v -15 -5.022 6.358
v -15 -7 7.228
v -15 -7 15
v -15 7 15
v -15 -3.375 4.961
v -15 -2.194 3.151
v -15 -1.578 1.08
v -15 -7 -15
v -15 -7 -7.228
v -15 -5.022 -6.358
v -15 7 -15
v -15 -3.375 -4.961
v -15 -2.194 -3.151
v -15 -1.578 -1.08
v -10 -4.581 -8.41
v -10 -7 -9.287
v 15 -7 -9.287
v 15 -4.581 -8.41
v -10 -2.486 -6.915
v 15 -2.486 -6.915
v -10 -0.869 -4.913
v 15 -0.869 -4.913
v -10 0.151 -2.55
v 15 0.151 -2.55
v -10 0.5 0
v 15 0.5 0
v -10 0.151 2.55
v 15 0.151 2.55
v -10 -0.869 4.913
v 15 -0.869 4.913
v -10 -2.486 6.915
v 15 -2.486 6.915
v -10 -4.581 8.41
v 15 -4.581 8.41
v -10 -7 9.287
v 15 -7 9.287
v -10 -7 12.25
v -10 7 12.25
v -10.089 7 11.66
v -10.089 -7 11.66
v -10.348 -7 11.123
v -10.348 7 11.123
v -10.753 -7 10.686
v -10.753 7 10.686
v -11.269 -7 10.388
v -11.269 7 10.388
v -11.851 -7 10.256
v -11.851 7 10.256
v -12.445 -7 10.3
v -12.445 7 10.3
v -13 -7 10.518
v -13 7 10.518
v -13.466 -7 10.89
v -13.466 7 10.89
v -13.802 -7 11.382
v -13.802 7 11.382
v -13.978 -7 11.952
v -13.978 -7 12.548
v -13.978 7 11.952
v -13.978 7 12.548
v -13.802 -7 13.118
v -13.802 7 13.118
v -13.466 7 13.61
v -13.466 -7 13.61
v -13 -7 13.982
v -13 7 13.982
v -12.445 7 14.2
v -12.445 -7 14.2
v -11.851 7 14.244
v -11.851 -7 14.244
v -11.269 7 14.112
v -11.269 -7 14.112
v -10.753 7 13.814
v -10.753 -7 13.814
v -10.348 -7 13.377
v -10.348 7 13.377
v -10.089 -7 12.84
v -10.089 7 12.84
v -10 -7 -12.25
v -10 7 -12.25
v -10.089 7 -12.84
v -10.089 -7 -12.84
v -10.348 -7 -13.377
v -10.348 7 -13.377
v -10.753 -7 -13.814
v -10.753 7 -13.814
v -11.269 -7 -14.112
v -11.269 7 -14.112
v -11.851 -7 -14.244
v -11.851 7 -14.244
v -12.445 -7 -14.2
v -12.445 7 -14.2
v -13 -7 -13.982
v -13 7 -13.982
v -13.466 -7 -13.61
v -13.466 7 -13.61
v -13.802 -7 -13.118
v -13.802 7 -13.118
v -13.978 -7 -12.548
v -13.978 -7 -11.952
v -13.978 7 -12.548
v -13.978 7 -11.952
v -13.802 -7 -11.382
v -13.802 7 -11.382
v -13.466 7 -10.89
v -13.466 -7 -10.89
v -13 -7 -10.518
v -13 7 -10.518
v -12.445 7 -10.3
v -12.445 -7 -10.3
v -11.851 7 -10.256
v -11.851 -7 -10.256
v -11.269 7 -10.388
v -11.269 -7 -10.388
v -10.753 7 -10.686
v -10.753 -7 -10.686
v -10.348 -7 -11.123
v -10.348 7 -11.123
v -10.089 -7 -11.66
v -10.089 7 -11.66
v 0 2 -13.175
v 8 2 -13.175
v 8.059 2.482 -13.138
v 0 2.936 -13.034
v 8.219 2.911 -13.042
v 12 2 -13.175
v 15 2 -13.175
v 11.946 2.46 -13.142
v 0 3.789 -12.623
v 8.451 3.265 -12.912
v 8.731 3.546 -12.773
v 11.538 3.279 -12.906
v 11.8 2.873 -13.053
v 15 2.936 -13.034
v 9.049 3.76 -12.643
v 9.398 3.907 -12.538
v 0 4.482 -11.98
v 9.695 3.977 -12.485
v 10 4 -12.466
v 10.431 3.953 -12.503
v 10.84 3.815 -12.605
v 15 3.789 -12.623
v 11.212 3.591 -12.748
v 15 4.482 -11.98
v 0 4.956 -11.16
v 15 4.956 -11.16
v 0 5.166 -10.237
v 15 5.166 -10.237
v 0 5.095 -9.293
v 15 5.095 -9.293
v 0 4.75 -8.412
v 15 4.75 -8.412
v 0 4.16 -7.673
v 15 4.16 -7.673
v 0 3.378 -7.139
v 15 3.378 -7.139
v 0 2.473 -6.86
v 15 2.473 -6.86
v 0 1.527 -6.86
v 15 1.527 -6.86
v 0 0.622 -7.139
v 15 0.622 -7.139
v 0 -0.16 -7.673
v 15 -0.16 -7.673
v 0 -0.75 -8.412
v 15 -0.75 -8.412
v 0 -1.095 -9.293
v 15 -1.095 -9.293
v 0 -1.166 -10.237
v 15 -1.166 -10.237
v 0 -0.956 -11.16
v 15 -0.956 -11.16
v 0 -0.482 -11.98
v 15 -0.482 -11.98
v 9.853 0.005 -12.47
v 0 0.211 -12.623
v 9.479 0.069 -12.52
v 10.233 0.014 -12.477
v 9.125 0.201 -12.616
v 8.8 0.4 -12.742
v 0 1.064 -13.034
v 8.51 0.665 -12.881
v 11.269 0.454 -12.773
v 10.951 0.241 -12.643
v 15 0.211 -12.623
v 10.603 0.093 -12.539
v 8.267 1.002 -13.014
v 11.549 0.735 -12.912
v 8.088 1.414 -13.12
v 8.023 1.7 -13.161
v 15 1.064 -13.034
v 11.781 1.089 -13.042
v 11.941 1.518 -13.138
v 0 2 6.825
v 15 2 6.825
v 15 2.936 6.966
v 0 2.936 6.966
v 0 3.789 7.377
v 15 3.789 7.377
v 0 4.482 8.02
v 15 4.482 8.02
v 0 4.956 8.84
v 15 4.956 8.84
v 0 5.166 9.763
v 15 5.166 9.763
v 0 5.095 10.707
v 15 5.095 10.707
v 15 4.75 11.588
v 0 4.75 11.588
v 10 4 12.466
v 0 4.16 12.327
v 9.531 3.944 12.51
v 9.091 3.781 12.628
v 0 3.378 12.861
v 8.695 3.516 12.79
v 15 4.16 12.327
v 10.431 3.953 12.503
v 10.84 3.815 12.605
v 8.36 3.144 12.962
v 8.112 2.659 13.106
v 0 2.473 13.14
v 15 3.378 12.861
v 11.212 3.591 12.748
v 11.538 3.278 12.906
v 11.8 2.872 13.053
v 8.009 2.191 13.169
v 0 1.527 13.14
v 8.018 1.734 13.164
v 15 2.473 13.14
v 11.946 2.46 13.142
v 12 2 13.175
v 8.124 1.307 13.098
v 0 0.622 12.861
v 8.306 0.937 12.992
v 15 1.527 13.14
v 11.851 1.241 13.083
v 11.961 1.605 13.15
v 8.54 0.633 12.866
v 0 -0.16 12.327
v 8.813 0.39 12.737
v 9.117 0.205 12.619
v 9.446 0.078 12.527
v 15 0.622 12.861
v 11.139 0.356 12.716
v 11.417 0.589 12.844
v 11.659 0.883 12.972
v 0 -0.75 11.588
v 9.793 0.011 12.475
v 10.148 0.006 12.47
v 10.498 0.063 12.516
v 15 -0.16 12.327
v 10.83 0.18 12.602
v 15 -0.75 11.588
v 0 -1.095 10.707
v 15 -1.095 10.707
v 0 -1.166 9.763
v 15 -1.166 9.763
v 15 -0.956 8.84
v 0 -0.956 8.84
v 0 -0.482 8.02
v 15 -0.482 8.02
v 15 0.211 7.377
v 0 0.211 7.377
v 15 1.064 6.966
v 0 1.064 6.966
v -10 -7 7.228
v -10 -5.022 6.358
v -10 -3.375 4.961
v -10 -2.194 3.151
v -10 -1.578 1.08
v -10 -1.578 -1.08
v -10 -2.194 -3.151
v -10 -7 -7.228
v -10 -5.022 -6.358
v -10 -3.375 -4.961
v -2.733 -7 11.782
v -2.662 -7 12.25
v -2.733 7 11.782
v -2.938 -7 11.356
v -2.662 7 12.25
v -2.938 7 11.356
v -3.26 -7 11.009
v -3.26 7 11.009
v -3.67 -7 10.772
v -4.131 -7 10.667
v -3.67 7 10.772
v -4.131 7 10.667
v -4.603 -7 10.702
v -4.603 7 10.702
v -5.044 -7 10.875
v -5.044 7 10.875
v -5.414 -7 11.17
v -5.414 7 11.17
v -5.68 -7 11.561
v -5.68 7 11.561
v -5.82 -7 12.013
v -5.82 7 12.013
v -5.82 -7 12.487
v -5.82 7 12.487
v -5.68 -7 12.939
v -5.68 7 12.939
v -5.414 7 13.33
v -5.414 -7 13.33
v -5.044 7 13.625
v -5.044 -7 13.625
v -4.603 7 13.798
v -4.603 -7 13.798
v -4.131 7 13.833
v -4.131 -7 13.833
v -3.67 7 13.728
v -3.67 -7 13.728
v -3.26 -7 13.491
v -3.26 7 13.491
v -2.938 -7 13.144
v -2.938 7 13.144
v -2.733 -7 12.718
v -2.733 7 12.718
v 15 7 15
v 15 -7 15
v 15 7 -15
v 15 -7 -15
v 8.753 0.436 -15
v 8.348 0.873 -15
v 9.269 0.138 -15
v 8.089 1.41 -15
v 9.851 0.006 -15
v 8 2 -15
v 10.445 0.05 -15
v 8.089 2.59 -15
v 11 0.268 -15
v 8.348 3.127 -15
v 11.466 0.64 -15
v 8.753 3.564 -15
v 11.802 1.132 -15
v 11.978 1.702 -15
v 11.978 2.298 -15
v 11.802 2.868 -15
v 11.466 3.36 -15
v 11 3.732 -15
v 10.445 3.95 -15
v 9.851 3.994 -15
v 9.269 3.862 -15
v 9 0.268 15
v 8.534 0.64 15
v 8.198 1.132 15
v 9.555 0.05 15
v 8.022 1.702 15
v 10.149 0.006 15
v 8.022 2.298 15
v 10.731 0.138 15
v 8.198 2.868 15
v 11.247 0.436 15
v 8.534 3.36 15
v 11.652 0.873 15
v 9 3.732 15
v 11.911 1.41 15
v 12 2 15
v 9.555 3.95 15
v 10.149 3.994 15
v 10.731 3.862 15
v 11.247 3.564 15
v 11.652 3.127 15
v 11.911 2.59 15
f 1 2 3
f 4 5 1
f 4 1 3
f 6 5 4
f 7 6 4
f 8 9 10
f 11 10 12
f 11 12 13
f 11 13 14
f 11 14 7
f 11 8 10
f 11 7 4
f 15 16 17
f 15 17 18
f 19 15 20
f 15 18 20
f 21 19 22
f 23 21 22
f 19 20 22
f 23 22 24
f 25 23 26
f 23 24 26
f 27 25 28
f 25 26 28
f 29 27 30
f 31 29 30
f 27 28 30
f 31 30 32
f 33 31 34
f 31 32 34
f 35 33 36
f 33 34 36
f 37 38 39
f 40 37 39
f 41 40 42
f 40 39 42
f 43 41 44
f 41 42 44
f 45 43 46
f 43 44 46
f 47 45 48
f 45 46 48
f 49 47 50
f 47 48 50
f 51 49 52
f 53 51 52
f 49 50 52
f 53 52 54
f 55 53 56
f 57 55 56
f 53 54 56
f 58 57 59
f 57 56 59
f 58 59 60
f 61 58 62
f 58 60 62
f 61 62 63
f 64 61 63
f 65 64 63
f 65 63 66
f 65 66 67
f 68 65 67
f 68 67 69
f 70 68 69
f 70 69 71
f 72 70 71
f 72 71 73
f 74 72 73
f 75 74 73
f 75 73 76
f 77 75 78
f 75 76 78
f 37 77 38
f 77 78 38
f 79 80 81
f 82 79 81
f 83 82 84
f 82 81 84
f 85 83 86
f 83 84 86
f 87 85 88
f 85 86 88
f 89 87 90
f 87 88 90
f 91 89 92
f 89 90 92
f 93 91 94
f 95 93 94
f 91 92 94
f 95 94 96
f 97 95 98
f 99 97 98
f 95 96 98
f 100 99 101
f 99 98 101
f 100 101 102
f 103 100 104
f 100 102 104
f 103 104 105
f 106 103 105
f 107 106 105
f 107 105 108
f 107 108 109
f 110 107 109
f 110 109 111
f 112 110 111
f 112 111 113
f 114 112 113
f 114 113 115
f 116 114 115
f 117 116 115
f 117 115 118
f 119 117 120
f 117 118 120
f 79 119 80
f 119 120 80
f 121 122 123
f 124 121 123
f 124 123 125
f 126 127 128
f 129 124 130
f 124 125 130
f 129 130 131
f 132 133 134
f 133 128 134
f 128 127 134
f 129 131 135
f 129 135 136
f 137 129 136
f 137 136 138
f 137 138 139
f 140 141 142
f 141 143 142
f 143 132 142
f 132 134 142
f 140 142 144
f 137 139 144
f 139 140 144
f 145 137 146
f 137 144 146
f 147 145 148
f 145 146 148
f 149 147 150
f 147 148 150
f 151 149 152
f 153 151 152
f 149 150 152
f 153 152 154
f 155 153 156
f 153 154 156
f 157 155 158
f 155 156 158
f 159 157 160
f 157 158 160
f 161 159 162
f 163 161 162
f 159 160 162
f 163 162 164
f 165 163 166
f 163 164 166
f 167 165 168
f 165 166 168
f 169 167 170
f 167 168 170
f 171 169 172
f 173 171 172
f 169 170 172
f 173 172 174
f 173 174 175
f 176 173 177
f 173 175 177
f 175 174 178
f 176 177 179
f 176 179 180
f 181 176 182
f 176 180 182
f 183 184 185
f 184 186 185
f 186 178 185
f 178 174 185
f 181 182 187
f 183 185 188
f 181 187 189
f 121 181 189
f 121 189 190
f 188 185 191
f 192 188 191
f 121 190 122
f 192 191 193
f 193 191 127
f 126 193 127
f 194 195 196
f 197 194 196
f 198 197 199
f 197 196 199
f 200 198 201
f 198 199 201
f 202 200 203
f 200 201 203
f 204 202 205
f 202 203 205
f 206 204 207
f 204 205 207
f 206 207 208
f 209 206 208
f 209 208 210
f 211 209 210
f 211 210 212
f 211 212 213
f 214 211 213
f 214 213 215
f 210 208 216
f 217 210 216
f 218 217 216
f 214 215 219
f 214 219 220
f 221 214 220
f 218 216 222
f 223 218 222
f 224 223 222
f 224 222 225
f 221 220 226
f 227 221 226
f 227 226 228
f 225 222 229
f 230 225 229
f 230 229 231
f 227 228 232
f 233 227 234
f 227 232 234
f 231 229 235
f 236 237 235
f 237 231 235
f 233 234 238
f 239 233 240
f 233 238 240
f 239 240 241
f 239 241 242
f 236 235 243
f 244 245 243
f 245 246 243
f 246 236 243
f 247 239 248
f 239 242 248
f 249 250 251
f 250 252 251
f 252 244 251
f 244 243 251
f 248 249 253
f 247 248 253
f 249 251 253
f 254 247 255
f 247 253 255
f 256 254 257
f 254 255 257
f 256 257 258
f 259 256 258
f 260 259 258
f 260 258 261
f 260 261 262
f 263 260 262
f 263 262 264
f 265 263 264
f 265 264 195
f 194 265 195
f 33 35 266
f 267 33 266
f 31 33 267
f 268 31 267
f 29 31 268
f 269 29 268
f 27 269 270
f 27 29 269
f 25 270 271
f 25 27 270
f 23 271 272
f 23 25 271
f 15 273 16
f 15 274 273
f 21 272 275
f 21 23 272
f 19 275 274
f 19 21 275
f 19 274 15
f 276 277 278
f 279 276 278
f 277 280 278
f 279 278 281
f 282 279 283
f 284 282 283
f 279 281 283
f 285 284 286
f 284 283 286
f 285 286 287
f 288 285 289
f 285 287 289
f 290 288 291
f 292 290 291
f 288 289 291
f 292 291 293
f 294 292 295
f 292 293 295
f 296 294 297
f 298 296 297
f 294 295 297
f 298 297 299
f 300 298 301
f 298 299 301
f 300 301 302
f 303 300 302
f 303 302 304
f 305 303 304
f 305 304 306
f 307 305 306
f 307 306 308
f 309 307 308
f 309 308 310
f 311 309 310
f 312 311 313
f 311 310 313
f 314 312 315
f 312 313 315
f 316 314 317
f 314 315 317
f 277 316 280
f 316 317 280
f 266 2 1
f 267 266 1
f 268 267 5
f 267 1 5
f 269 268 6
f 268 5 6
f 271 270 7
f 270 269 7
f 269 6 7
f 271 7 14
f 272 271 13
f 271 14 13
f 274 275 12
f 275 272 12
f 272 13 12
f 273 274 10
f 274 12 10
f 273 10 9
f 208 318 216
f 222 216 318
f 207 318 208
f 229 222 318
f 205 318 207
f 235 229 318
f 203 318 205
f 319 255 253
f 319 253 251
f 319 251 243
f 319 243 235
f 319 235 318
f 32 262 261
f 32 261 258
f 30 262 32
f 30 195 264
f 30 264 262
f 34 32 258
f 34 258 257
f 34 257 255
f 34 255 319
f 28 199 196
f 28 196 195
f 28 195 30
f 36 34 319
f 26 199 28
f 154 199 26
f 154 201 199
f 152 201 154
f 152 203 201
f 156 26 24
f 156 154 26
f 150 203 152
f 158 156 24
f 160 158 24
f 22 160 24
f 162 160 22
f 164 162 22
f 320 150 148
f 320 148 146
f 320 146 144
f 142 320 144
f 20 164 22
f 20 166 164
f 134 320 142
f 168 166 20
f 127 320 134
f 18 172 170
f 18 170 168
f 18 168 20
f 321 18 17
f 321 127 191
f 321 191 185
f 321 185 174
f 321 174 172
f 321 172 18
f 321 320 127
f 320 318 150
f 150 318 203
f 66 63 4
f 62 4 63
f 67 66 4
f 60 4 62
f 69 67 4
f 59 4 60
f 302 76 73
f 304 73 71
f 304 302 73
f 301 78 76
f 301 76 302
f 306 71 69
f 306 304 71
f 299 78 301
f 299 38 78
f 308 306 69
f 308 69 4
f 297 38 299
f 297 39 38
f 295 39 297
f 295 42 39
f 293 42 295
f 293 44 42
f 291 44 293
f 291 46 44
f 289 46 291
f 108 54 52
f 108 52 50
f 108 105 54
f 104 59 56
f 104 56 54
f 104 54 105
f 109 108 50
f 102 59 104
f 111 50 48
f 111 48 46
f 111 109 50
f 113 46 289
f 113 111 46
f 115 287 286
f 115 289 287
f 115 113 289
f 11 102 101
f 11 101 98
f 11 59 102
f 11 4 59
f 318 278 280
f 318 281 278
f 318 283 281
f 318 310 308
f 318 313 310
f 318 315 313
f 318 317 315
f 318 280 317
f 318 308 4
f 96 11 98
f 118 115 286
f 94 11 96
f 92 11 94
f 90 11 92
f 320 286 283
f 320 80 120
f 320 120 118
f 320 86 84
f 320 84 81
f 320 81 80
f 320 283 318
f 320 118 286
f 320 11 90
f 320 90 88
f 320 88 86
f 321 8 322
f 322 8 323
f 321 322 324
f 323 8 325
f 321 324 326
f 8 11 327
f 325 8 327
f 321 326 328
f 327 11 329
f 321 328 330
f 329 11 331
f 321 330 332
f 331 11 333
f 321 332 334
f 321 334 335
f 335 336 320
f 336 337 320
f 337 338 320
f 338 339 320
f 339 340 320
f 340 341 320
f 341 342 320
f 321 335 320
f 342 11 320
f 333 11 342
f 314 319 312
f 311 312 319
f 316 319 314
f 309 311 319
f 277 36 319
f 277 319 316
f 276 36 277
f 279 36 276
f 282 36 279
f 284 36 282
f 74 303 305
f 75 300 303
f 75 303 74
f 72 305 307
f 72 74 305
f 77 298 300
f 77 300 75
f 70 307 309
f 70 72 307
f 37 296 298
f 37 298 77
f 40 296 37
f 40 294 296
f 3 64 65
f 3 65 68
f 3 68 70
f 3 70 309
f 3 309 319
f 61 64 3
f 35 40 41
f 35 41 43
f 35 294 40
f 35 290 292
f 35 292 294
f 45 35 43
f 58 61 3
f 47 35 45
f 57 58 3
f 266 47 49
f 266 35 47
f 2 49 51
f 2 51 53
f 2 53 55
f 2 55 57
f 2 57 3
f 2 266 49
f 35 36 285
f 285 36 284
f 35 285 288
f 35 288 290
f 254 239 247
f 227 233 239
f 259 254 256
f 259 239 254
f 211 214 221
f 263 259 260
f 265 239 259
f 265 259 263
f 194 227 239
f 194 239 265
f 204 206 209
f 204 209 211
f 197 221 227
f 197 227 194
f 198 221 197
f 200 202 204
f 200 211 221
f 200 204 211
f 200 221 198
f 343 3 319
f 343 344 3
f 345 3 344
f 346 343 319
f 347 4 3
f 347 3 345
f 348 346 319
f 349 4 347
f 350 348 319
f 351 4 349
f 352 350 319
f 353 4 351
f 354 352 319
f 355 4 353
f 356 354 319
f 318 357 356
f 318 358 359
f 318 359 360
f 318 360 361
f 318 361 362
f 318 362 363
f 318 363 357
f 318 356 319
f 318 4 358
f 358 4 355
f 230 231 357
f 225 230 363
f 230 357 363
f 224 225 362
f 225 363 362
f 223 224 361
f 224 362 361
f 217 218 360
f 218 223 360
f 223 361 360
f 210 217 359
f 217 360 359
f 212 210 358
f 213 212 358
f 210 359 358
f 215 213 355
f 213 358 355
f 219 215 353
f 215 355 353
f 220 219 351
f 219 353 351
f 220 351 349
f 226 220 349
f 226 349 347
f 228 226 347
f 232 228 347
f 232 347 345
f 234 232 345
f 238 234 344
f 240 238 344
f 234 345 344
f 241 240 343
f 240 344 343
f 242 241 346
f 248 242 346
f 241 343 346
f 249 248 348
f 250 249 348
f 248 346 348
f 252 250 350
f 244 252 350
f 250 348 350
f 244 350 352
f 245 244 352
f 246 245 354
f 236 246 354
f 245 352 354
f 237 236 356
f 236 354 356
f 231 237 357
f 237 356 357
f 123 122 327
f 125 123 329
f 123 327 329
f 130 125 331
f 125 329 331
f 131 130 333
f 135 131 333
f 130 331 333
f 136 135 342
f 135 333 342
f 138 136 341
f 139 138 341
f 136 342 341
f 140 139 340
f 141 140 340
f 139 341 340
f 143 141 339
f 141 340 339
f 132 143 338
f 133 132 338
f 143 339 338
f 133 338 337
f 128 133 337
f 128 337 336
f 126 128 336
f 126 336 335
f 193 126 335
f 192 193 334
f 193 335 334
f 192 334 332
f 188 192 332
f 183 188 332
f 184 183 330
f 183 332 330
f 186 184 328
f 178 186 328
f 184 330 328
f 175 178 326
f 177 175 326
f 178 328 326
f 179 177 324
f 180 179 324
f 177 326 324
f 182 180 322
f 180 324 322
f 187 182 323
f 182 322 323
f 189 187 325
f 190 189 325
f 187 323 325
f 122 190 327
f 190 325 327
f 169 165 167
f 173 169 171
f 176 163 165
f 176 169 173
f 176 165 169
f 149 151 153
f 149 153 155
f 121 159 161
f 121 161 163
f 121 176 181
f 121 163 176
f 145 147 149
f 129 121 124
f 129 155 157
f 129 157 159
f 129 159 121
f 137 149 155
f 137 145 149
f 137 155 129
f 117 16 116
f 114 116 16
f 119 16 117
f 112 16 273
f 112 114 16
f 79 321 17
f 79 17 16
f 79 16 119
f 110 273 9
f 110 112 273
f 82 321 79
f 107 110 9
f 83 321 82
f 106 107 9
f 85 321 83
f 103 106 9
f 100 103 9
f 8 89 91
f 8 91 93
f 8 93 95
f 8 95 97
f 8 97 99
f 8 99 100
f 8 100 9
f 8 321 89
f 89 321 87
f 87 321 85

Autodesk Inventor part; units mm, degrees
ref_plane "YZ Plane" through (0, 0, 0) normal (1, 0, 0) x (0, 1, 0)
ref_plane "XZ Plane" through (0, 0, 0) normal (0, 1, 0) x (-1, 0, 0)
ref_plane "XY Plane" through (0, 0, 0) normal (0, 0, 1) x (1, 0, 0)
sketch "Sketch1" plane through (0, 0, 0) normal (0, 0, 1) x (1, 0, 0)
  line L0 (15, -7) -> (-15, -7)
  line L1 (-15, -7) -> (-15, 7)
  line L2 (-15, 7) -> (15, 7)
  line L3 (15, 7) -> (15, -7)
  line L4 (15, -7) -> (-15, 7) construction
  line L5 (-15, -7) -> (15, 7) construction
  point P0 (0, 0)
  dimension "d0" = 30
  dimension "d1" = 14
extrude "Extrusion1" add sketch "Sketch1" along normal blind 30
sketch "Sketch3" plane through (15, -7, 0) normal (1, 0, 0) x (0, 0, -1)
  line L0 (0, 0) -> (-30, 0) projected
  line L1 (-15, 0) -> (-15, -2)
  arc A0 (-5.7129, 0) -> (-24.2871, 0) centre (-15, -2) ccw
  point P0 (0, 7)
  dimension "d4" = 2
  dimension "d5" = 19
extrude "Extrusion2" cut sketch "Sketch3" against normal blind 25
sketch "Sketch5" plane through (-15, 7, 0) normal (0, 1, 0) x (1, 0, 0)
  line L0 (30, 0) -> (0, 0) projected
  line L1 (30, -30) -> (0, -30) projected
  line L2 (0, -30) -> (0, -27.25)
  line L3 (0, 0) -> (0, -30) projected
  line L4 (0, -27.25) -> (2.75, -27.25)
  circle A0 centre (2.75, -27.25) radius 2
  line L5 (0, 0) -> (0, -2.75)
  line L6 (0, -2.75) -> (2.75, -2.75)
  circle A1 centre (2.75, -2.75) radius 2
  line L7 (2.75, -27.25) -> (10.75, -27.25)
  circle A2 centre (10.75, -27.25) radius 1.5875
  point P0 (15, 0)
  dimension "d11" = 2.75
  dimension "d12" = 2.75
  dimension "d13" = 4
  dimension "d14" = 2.75
  dimension "d15" = 2.75
  dimension "d16" = 4
  dimension "d17" = 8
  dimension "d18" = 3.175
extrude "Extrusion3" cut sketch "Sketch5" against normal blind 100 contours A2
sketch "Sketch6" plane through (-15, 7, 0) normal (0, 1, 0) x (1, 0, 0)
  point P0 (15, 0)
sketch "Sketch7" plane through (15, -7, 0) normal (1, 0, 0) x (0, 0, -1)
  line L0 (0, 14) -> (-30, 14) projected
  line L1 (-30, 14) -> (-25, 14)
  line L2 (-25, 14) -> (-25, 9)
  line L3 (0, 14) -> (0, 0) projected
  line L4 (0, 14) -> (-5, 14)
  line L5 (-5, 14) -> (-5, 9)
  circle A0 centre (-25, 9) radius 3.175
  circle A1 centre (-5, 9) radius 3.175
  point P0 (0, 7)
  dimension "d21" = 5
  dimension "d22" = 5
  dimension "d23" = 5
  dimension "d24" = 5
  dimension "d25" = 6.35
  dimension "d26" = 6.35
extrude "Extrusion4" cut sketch "Sketch7" against normal blind 15
move or copy body "Move Body1" bodies to move or copy 1 copy no translate (-20, 0, 0)
move or copy body "Move Body2" bodies to move or copy 1 copy no translate (-5, 0, 0)
sketch "Sketch8" plane through (0, 0, 0) normal (1, 0, 0) x (0, 1, 0)
  point P0 (0, 0)
sketch "Sketch9" plane through (-40, 7, 0) normal (0, 1, 0) x (1, 0, 0)
  line L0 (30, -30) -> (0, -30) projected
  line L1 (0, -30) -> (0, -27.25)
  line L2 (0, 0) -> (0, -30) projected
  line L3 (0, -27.25) -> (3, -27.25)
  circle A0 centre (3, -27.25) radius 2
  line L4 (0, 0) -> (0, -2.75)
  line L5 (0, -2.75) -> (3, -2.75)
  circle A1 centre (3, -2.75) radius 2
  point P0 (40, 0)
  dimension "d35" = 2.75
  dimension "d36" = 3
  dimension "d37" = 4
  dimension "d38" = 2.75
  dimension "d39" = 4
  dimension "d40" = 3
extrude "Extrusion5" cut sketch "Sketch9" against normal blind 14
sketch "Sketch14" plane through (-40, 7, 30) normal (0, 0, 1) x (1, 0, 0)
  line L0 (30, 0) -> (0, 0) projected
  line L1 (30, 0) -> (25, 0)
  line L2 (25, 0) -> (25, -5)
  circle A0 centre (25, -5) radius 2
  point P0 (40, -7)
  dimension "d47" = 5
  dimension "d48" = 5
  dimension "d49" = 4
extrude "Extrusion6" cut sketch "Sketch14" against normal blind 3
sketch "Sketch15" plane through (-10, 7, 0) normal (0, 0, -1) x (-1, 0, 0)
  line L0 (0, -14) -> (0, 0) projected
  line L1 (0, 0) -> (5, 0)
  line L2 (0, 0) -> (30, 0) projected
  line L3 (5, 0) -> (5, -5)
  circle A0 centre (5, -5) radius 2
  point P0 (-10, -7)
  dimension "d52" = 5
  dimension "d53" = 5
  dimension "d54" = 4
extrude "Extrusion7" cut sketch "Sketch15" against normal blind 4
thread "Thread3" size "M4x0.7" class "6H" standard "ANSI Metric M Profile" full length
thread "Thread4" size "M4x0.7" class "6H" standard "ANSI Metric M Profile" full length
sketch "Sketch16" plane through (-40, -7, 0) normal (-1, 0, 0) x (0, 0, 1)
  line L0 (0, 14) -> (30, 14) projected
  line L1 (0, 14) -> (15, 14)
  line L2 (15, 14) -> (15, -2)
  circle A0 centre (15, -2) radius 7.5
  point P0 (0, 7)
  dimension "d61" = 16
  dimension "d62" = 15
extrude "Extrusion8" cut sketch "Sketch16" against normal blind 15
move or copy body "Move Body3" bodies to move or copy 1 copy no translate (25, 0, 0)
move or copy body "Move Body4" bodies to move or copy 1 copy no translate (10, 0, -15)
move or copy body "Move Body5" bodies to move or copy 1 copy no translate (-10, 0, 0)
sketch "Sketch17" plane through (15, -7, -15) normal (1, 0, 0) x (0, 0, -1)
  point P0 (-15, 7)
equation "\"d55\" = d54"
properties part number "Rb oven housing top-back" material "Copper"
